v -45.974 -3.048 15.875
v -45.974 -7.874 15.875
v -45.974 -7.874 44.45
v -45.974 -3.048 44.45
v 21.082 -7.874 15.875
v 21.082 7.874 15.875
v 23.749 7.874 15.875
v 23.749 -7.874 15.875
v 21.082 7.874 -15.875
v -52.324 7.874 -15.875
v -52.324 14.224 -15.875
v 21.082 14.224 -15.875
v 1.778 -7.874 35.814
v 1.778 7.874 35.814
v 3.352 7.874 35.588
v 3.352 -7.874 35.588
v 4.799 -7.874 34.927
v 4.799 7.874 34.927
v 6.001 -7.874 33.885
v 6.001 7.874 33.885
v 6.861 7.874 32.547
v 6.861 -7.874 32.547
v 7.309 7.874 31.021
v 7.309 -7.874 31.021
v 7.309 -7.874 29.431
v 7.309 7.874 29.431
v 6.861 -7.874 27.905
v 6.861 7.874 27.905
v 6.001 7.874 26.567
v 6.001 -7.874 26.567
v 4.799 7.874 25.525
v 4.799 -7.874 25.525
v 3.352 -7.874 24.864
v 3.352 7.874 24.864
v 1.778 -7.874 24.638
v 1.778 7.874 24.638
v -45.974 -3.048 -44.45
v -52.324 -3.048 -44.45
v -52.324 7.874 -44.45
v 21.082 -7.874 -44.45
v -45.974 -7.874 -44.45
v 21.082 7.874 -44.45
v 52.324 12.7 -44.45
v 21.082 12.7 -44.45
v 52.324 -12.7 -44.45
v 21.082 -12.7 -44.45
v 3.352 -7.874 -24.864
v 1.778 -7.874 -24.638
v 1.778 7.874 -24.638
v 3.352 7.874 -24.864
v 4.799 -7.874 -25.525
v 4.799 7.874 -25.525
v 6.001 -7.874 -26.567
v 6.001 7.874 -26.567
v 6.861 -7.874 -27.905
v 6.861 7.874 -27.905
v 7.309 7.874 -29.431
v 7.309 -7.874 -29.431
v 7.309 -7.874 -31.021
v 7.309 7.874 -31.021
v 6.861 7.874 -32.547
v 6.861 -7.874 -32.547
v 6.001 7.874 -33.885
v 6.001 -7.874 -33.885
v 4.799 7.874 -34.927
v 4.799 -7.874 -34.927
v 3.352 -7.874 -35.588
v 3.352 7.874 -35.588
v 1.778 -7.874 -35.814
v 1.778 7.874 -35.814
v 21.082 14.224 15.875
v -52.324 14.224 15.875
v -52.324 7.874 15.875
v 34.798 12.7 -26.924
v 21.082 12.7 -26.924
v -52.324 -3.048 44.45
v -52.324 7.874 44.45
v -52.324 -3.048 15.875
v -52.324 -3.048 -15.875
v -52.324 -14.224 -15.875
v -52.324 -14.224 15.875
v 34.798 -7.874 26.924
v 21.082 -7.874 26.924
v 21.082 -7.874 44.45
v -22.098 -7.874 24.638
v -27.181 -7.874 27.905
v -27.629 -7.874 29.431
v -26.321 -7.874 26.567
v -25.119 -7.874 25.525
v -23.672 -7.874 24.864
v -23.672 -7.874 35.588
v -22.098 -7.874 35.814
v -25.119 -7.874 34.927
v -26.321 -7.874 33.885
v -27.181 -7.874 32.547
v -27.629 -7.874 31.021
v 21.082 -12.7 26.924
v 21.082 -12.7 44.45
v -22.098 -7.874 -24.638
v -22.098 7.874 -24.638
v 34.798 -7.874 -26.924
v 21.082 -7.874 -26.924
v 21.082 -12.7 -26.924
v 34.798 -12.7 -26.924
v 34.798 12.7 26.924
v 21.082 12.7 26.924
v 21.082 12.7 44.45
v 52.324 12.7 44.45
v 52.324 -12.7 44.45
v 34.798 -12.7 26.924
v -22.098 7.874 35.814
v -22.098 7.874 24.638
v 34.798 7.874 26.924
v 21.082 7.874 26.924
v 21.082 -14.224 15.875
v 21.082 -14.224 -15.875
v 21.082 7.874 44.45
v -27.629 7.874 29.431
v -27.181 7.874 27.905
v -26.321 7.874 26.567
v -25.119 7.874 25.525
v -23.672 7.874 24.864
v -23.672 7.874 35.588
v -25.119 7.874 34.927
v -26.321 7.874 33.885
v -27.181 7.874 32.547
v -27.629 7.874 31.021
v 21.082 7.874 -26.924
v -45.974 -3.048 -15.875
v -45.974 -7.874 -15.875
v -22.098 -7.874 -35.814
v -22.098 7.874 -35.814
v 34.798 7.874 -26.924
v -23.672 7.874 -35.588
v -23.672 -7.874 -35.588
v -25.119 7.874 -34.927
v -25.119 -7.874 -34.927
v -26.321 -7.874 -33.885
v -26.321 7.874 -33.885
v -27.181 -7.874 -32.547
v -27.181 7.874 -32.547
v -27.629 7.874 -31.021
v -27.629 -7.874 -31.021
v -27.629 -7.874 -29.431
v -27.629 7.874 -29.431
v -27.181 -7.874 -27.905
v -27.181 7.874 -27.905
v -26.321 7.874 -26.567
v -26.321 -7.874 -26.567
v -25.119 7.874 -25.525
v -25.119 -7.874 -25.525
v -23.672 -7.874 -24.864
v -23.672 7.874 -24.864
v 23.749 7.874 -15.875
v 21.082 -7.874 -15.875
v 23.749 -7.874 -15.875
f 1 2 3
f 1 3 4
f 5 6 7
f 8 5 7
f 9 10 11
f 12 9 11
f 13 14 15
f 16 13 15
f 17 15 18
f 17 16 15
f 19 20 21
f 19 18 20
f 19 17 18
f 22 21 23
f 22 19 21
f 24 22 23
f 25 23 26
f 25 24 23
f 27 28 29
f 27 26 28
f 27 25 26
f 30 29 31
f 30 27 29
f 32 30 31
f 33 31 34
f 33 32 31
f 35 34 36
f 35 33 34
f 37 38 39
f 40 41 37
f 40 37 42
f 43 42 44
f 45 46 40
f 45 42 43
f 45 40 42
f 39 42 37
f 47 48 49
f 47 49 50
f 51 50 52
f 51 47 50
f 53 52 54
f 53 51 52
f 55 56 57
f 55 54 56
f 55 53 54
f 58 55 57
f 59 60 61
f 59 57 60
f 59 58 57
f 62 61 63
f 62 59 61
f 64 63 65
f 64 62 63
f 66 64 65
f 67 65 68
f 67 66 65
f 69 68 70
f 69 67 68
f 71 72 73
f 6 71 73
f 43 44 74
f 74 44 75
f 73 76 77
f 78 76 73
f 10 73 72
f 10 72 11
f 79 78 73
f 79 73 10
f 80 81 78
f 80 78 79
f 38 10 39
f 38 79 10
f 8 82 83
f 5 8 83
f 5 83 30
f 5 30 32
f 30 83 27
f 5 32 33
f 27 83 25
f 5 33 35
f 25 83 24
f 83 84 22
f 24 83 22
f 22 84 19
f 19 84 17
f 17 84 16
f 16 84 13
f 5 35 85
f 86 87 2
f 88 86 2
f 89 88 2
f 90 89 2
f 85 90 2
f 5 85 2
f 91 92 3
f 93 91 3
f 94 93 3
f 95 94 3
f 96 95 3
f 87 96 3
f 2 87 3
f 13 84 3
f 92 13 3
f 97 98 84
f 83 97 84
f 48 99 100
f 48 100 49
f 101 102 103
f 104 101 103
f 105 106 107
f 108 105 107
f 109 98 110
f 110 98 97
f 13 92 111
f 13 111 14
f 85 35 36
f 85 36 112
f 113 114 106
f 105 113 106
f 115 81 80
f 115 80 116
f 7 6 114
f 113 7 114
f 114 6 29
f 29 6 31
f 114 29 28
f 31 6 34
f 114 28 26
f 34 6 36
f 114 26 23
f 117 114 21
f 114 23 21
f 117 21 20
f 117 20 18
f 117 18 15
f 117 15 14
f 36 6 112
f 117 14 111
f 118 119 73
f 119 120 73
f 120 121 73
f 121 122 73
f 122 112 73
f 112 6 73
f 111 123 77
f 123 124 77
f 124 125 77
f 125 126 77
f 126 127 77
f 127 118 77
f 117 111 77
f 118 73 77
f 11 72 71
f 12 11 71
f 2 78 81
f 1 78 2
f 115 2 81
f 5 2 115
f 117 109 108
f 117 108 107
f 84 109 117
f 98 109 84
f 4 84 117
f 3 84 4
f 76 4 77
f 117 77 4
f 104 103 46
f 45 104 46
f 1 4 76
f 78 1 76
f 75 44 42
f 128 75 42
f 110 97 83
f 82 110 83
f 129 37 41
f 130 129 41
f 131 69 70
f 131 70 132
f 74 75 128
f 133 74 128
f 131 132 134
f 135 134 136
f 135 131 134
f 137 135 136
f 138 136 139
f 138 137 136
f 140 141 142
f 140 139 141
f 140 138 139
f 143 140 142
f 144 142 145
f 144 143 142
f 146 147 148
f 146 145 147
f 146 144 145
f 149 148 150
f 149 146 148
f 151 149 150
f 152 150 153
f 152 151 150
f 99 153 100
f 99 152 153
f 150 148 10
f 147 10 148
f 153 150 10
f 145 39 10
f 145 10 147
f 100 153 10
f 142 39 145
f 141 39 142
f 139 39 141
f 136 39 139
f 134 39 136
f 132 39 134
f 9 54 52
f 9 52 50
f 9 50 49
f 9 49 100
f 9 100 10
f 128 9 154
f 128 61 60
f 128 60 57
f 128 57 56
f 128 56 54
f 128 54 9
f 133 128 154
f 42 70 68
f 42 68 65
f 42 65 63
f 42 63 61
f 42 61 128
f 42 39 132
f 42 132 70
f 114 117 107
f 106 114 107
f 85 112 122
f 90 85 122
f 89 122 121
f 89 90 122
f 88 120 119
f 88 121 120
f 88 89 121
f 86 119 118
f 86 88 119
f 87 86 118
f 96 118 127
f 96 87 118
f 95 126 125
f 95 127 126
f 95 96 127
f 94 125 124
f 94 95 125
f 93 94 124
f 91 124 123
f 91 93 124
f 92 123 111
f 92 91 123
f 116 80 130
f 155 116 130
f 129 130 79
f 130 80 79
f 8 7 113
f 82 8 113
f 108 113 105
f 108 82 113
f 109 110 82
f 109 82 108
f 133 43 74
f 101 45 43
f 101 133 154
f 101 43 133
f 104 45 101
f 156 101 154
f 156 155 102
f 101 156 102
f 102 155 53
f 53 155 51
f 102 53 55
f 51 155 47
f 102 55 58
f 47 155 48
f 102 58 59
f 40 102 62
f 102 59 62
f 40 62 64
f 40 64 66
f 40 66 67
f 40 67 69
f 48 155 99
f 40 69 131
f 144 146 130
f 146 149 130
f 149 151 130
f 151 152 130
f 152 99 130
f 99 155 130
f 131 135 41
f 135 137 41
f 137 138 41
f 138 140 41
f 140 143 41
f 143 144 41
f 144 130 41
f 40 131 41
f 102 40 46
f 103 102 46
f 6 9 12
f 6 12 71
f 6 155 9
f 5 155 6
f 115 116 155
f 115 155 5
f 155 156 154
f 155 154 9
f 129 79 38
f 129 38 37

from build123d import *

# Parameters (mm, degrees)
F0_W      = 6.35
F0_H      = 28.575
F1_DEPTH  = 14.224
F4_DEPTH  = 130.049
F6_W      = 73.406
F6_H      = 6.35
F7_DEPTH  = 48.387
F9_W      = 73.406
F9_H      = 6.35
F10_DEPTH = 53.975


with BuildPart() as f1:
    # F0 (on Front) → F1 (new body, symmetric)
    with BuildSketch(Plane.XZ):
        with Locations((-49.149, 30.1625)):
            Rectangle(F0_W, F0_H)
        Polygon((17.272, 44.45), (-45.974, 44.45), (-45.974, 15.875), (21.082, 15.875), (23.749, 15.875), (34.798, 26.924), (17.272, 26.924), align=None)
        with BuildLine():
            ThreePointArc((-22.098, 24.638), (-27.686, 30.226), (-22.098, 35.814))
            Line((-22.098, 35.814), (1.778, 35.814))
            ThreePointArc((1.778, 35.814), (7.366, 30.226), (1.778, 24.638))
            Line((1.778, 24.638), (-22.098, 24.638))
        make_face(mode=Mode.SUBTRACT)
        Polygon((-45.974, 15.875), (-52.324, 15.875), (-52.324, -15.875), (-45.974, -15.875), (21.082, -15.875), (21.082, 15.875), align=None)
        Polygon((52.324, 44.45), (17.272, 44.45), (17.272, 26.924), (34.798, 26.924), align=None)
        with Locations((-49.149, -30.1625)):
            Rectangle(F0_W, F0_H)
        Polygon((21.082, -15.875), (-45.974, -15.875), (-45.974, -44.45), (17.272, -44.45), (17.272, -26.924), (34.798, -26.924), (23.749, -15.875), align=None)
        with BuildLine():
            Line((1.778, -35.814), (-22.098, -35.814))
            ThreePointArc((-22.098, -35.814), (-27.686, -30.226), (-22.098, -24.638))
            Line((-22.098, -24.638), (1.778, -24.638))
            ThreePointArc((1.778, -24.638), (7.366, -30.226), (1.778, -35.814))
        make_face(mode=Mode.SUBTRACT)
        Polygon((17.272, -26.924), (17.272, -44.45), (52.324, -44.45), (34.798, -26.924), align=None)
    extrude(amount=F1_DEPTH, both=True)

    # F3 (on offset) → F4 (cut, through all)
    with BuildSketch(Plane(origin=(-77.724, 0, 0), x_dir=(0, -1, 0), z_dir=(-1, 0, 0))):
        Polygon((-14.224, 44.45), (-14.224, 15.875), (-7.874, 15.875), (-7.874, 26.924), (-12.7, 26.924), (-12.7, 44.45), align=None)
        Polygon((7.874, 26.924), (7.874, 15.875), (14.224, 15.875), (14.224, 44.45), (12.7, 44.45), (12.7, 26.924), align=None)
        Polygon((-7.874, -15.875), (-14.224, -15.875), (-14.224, -44.45), (-12.7, -44.45), (-12.7, -26.924), (-7.874, -26.924), align=None)
        Polygon((14.224, -15.875), (7.874, -15.875), (7.874, -26.924), (12.7, -26.924), (12.7, -44.45), (14.224, -44.45), align=None)
    extrude(amount=-F4_DEPTH, mode=Mode.SUBTRACT)

    # F6 (on offset) → F7 (cut, through all)
    with BuildSketch(Plane.XY.offset(64.262)):
        Polygon((-52.324, -14.224), (21.082, -14.224), (21.082, -7.874), (-45.974, -7.874), (-45.974, -3.048), (-52.324, -3.048), align=None)
        with Locations((-15.621, 11.049)):
            Rectangle(F6_W, F6_H)
    extrude(amount=-F7_DEPTH, mode=Mode.SUBTRACT)

    # F9 (on offset) → F10 (cut, through all)
    with BuildSketch(Plane(origin=(0, 0, -69.85), x_dir=(1, 0, 0), z_dir=(0, 0, -1))):
        Polygon((-52.324, 14.224), (-52.324, 3.048), (-45.974, 3.048), (-45.974, 7.874), (21.082, 7.874), (21.082, 14.224), align=None)
        with Locations((-15.621, -11.049)):
            Rectangle(F9_W, F9_H)
    extrude(amount=-F10_DEPTH, mode=Mode.SUBTRACT)


solid = f1.part
